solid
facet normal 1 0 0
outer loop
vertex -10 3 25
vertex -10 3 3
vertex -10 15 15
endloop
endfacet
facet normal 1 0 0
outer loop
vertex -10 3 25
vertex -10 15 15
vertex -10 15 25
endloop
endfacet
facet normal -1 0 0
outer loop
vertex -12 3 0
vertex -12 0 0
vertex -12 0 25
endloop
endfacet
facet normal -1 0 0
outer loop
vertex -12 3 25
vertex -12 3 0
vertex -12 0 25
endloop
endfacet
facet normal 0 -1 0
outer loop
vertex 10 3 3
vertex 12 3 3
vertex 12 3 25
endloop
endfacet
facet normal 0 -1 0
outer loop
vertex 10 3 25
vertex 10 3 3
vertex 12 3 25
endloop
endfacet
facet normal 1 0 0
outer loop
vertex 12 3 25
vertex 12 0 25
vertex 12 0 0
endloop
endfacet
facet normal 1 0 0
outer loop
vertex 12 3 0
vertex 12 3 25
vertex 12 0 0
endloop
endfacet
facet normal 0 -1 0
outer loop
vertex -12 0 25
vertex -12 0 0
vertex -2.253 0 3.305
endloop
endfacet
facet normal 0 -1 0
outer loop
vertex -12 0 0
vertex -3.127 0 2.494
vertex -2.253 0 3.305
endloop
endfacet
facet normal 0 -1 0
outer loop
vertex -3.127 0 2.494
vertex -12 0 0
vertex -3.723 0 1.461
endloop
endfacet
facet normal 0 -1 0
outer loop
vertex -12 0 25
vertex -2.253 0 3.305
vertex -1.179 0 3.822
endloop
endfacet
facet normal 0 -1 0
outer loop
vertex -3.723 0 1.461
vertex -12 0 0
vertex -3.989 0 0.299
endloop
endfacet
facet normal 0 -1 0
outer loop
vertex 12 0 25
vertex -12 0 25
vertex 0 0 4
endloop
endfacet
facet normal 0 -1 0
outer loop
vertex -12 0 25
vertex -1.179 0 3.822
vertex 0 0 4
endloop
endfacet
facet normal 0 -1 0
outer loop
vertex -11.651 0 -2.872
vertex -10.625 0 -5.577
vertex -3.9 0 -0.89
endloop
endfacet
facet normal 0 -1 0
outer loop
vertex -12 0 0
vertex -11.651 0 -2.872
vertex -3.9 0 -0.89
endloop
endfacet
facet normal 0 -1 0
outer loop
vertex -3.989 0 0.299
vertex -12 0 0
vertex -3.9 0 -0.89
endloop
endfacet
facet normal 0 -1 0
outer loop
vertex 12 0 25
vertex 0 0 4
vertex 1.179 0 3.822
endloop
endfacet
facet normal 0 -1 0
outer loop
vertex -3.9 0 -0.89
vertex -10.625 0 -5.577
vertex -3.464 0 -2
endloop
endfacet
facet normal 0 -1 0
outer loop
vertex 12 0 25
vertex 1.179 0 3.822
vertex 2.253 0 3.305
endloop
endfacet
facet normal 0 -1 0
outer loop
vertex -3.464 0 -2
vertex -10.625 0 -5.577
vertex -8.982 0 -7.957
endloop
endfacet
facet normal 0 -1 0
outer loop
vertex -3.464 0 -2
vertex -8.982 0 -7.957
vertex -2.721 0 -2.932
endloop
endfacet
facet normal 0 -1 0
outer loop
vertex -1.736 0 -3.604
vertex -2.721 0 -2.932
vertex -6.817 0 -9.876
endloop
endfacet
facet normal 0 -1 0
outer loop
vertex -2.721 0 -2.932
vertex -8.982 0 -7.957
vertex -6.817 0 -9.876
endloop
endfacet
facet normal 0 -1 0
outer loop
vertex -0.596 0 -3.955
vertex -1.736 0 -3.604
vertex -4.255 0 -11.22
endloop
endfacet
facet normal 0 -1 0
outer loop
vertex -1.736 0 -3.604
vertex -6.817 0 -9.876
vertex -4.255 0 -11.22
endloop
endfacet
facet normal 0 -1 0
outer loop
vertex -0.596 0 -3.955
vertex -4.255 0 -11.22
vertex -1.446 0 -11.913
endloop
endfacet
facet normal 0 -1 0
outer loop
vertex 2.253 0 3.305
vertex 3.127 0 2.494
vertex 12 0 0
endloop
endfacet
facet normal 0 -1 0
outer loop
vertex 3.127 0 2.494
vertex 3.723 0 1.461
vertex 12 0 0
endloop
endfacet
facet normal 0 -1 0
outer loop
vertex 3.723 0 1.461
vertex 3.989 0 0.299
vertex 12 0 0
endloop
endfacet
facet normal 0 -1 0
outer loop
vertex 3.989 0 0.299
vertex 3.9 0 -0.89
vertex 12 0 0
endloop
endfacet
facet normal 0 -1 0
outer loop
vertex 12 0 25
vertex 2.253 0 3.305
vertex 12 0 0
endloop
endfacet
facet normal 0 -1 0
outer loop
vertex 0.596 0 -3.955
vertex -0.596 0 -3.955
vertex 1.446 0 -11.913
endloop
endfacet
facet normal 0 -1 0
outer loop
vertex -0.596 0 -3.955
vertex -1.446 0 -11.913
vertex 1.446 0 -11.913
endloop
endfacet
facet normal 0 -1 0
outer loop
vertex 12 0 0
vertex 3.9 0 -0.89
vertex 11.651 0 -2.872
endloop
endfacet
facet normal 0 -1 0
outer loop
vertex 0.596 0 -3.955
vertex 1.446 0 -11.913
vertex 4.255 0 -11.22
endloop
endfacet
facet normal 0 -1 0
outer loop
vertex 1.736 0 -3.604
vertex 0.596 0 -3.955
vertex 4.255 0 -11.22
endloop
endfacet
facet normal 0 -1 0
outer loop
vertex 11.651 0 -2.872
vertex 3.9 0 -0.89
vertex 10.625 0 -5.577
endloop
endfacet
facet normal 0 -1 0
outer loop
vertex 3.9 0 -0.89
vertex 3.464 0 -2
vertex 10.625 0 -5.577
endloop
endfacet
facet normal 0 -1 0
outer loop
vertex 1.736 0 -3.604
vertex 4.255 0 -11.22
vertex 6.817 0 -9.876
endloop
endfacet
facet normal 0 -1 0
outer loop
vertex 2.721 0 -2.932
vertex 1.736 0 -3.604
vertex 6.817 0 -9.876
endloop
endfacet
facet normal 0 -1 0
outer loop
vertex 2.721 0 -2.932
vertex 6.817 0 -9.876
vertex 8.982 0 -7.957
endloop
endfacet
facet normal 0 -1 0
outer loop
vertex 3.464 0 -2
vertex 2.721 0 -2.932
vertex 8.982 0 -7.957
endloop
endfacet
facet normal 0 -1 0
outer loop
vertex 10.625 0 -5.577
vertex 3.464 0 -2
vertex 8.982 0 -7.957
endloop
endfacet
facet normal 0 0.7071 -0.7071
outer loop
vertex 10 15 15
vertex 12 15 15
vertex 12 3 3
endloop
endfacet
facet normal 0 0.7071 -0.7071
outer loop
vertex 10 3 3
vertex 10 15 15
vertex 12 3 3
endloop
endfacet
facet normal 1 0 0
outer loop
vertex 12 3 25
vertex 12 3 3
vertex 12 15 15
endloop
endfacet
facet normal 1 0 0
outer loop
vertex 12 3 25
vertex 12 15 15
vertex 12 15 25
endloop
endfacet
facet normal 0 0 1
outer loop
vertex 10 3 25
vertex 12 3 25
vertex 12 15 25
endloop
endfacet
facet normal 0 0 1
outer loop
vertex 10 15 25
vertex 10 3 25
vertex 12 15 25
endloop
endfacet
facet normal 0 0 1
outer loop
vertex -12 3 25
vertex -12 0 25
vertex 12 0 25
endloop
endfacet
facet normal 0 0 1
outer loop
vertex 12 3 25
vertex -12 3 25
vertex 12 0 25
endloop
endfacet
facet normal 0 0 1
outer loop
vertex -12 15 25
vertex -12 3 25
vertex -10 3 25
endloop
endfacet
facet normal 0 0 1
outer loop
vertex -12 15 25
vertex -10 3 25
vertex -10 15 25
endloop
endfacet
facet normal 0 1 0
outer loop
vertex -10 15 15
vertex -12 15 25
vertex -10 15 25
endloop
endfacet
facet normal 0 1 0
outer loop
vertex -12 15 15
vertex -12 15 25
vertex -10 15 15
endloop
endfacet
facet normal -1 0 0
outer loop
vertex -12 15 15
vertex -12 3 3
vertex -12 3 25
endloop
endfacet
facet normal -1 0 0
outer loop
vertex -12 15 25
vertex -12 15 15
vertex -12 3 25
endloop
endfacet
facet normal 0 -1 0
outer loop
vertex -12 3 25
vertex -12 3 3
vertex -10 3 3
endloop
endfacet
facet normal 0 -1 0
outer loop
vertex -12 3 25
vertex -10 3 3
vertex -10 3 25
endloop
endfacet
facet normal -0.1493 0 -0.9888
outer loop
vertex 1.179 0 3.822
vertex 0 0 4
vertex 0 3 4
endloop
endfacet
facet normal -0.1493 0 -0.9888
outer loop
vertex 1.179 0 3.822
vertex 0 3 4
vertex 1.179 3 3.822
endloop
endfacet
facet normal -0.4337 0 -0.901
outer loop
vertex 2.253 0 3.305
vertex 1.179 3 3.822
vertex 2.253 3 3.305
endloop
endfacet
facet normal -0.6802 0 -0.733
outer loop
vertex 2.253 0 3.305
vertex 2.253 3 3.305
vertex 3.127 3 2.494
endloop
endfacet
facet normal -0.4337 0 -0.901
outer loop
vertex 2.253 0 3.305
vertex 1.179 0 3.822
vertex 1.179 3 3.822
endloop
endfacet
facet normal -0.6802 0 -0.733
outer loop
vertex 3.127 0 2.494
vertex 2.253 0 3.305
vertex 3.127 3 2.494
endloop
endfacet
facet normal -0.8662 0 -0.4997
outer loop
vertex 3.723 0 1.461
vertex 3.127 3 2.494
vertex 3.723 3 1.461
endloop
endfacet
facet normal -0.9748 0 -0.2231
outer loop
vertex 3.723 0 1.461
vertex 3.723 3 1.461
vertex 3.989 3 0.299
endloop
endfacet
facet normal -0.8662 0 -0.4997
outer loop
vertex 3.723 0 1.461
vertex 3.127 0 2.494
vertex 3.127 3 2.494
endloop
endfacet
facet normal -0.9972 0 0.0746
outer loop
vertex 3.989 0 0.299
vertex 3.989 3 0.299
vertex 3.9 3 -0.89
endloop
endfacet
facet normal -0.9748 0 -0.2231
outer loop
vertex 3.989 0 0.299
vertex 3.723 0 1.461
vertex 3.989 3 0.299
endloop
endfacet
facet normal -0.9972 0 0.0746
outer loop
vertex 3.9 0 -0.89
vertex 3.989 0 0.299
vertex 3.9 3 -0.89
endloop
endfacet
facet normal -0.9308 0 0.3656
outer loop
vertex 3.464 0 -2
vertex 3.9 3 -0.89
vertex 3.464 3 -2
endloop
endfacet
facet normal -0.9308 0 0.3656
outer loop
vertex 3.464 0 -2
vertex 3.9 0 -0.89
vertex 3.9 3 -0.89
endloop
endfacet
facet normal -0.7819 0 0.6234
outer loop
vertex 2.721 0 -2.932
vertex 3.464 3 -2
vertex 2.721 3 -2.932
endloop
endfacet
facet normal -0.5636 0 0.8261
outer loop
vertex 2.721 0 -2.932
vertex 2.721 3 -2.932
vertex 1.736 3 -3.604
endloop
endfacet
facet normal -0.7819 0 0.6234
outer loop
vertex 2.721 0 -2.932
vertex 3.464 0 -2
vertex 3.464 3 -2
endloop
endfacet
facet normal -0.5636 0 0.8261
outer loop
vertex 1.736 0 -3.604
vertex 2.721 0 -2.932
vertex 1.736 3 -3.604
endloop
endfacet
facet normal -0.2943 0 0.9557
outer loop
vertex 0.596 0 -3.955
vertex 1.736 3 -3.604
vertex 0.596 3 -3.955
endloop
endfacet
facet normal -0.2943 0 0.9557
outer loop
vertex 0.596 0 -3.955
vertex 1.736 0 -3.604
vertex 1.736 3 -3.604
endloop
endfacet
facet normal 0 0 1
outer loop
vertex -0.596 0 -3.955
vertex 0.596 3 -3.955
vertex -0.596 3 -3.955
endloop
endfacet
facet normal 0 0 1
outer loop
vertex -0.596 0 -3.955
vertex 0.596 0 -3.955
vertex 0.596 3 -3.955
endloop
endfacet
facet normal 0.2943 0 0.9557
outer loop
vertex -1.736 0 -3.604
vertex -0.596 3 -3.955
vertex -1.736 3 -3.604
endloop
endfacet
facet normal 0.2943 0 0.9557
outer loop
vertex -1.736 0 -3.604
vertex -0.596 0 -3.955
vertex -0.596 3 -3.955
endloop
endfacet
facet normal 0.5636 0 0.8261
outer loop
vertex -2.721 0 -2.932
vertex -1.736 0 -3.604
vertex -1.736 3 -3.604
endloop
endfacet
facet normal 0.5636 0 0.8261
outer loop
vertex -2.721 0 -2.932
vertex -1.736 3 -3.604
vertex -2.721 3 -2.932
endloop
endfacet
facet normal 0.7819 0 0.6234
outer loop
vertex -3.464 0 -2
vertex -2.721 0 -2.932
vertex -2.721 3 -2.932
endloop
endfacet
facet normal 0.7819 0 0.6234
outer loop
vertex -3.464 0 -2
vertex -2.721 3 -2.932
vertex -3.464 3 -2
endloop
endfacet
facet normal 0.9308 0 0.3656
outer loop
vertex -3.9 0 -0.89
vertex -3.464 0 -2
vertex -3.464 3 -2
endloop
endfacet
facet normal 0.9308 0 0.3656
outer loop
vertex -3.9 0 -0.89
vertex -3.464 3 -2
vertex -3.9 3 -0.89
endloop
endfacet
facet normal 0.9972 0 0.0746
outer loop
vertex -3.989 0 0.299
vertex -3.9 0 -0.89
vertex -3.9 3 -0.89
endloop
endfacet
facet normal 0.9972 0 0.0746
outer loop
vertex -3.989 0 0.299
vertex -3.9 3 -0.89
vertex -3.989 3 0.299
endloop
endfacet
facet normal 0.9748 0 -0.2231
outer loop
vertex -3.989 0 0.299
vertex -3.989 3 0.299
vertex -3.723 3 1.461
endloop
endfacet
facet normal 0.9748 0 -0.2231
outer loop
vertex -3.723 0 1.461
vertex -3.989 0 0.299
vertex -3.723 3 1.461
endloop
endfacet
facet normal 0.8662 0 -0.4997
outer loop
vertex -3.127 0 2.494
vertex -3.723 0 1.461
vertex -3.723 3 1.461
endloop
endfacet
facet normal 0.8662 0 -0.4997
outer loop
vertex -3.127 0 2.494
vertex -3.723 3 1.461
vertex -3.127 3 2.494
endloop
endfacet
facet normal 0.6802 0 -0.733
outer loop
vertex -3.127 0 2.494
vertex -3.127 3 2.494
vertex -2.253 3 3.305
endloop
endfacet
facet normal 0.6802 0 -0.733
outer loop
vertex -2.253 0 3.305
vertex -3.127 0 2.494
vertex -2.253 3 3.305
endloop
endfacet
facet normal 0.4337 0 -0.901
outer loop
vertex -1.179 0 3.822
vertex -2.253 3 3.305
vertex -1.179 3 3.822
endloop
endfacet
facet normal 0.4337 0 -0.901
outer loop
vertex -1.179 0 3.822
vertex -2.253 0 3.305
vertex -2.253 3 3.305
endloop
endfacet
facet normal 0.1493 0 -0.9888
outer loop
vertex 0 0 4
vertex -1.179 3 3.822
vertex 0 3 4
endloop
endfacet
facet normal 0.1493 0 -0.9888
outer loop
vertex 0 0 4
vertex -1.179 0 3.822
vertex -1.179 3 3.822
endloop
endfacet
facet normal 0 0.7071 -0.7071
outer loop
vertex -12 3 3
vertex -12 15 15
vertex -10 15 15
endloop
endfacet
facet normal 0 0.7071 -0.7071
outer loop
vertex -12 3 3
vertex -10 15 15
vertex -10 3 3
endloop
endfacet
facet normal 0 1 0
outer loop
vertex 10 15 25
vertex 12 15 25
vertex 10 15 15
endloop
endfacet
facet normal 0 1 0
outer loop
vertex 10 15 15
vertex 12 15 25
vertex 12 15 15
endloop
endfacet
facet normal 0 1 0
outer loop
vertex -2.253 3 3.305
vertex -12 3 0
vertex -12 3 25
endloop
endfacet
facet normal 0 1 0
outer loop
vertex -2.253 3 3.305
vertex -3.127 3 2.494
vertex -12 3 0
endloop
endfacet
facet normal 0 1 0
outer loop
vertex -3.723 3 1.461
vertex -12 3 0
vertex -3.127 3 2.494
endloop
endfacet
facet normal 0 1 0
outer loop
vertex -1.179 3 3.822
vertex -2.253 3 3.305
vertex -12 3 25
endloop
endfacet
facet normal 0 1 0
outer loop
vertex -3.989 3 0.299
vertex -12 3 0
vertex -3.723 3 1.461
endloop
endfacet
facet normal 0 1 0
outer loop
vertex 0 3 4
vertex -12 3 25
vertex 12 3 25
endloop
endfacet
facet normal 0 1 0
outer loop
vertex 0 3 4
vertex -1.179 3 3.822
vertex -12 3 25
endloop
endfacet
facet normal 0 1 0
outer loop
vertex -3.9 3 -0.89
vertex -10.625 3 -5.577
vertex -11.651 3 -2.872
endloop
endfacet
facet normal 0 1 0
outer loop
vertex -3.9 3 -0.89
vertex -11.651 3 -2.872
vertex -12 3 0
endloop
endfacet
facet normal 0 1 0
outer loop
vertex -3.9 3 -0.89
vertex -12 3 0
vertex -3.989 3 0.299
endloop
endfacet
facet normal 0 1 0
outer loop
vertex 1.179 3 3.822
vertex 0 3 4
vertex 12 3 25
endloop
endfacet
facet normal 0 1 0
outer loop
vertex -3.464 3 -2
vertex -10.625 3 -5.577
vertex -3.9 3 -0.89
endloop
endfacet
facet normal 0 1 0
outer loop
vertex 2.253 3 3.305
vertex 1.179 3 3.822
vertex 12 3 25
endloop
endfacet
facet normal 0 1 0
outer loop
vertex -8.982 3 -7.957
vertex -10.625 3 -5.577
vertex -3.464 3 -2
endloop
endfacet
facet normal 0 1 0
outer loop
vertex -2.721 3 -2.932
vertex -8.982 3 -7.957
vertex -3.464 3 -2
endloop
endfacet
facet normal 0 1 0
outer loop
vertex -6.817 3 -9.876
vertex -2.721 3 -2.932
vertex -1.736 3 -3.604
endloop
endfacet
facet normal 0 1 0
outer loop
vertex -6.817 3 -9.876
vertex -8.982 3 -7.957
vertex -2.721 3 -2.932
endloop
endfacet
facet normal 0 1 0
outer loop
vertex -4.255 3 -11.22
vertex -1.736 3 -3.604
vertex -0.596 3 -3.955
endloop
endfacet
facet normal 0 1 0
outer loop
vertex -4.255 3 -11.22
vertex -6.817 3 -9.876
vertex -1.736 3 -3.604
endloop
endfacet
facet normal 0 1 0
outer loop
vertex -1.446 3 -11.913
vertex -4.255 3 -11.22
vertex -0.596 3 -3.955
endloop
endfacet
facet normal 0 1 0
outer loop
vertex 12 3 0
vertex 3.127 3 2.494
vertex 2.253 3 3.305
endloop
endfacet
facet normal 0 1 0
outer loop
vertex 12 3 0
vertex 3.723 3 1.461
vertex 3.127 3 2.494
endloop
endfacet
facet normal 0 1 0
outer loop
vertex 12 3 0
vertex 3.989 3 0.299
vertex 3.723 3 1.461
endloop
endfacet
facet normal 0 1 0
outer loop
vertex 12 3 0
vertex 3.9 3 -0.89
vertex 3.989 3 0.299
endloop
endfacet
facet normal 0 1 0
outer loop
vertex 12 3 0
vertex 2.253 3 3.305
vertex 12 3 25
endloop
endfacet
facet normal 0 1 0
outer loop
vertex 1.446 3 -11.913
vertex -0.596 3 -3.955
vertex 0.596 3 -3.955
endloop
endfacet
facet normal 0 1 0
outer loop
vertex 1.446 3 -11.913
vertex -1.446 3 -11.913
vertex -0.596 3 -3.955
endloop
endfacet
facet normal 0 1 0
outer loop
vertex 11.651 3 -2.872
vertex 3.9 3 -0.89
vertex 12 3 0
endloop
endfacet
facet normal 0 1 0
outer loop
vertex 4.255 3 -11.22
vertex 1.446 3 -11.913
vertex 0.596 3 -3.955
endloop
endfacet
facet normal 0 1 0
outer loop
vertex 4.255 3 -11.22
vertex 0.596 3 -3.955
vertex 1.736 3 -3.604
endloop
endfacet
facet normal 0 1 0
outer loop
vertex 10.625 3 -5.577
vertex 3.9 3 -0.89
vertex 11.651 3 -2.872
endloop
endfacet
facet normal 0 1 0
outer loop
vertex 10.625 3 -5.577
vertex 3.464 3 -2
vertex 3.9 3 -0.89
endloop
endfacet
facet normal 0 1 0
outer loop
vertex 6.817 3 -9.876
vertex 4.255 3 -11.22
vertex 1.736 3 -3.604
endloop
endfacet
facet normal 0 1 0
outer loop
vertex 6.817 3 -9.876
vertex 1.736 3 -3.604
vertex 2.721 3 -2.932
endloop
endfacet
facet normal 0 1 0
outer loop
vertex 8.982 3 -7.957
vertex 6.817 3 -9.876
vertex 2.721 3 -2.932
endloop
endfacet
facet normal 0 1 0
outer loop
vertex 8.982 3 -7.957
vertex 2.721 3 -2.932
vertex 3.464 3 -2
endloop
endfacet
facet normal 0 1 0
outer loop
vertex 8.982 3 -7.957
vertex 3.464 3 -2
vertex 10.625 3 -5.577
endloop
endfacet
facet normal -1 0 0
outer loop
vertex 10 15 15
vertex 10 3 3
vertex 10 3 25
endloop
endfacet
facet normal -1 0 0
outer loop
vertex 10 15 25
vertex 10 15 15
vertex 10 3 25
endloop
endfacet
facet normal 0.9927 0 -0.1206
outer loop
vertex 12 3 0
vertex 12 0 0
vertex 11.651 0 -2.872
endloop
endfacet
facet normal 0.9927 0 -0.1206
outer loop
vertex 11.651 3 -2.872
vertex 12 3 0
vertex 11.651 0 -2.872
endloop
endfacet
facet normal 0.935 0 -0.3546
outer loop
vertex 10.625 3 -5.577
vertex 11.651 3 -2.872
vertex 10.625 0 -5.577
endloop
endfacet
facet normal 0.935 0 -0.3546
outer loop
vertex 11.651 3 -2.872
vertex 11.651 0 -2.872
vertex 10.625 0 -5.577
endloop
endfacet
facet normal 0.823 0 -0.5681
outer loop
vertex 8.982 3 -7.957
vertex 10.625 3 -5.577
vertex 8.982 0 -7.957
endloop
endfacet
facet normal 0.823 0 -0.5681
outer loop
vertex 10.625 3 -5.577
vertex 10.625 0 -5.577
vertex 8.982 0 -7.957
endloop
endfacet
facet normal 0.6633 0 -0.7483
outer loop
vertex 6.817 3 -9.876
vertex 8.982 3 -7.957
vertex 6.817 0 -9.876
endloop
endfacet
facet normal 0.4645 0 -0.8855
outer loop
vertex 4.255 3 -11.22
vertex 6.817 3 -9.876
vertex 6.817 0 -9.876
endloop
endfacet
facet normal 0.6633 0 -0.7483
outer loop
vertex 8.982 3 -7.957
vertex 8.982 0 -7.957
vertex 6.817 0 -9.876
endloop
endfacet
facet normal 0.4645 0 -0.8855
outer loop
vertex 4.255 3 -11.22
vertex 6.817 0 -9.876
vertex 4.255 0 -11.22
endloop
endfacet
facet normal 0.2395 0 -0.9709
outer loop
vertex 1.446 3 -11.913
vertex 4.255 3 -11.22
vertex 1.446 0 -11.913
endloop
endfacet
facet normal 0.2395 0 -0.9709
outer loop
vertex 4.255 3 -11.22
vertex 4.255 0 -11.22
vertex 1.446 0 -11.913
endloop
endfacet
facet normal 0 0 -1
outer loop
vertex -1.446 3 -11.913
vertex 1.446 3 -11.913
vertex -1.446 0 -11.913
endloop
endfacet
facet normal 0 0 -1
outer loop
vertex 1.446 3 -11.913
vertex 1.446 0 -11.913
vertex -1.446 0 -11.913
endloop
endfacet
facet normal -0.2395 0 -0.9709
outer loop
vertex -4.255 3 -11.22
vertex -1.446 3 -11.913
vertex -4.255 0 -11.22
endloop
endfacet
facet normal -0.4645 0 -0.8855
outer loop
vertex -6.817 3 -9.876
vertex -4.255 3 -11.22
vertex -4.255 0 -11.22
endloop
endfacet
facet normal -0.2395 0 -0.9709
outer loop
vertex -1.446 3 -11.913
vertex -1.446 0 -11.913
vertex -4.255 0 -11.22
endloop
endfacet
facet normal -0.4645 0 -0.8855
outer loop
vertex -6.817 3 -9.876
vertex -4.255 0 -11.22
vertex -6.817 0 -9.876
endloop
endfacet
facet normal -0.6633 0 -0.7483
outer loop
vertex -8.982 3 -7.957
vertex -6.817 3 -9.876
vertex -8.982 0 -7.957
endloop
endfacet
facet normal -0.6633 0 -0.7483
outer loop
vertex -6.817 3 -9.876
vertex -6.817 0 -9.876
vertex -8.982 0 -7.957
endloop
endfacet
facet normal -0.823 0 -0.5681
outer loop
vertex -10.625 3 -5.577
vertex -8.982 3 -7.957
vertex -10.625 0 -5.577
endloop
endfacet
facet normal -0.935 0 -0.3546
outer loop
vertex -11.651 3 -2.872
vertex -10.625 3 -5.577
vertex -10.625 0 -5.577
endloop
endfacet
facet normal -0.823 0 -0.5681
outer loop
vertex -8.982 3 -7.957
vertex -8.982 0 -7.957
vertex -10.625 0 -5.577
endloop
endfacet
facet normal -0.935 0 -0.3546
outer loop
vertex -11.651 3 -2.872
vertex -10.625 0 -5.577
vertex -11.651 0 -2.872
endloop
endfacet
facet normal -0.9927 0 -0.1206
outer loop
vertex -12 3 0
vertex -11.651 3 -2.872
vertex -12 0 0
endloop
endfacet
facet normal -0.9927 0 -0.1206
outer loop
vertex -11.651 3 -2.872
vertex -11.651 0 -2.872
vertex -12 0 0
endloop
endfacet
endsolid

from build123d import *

# Parameters (mm, degrees)
SKETCH_1_R          = 12
SKETCH_1_R_2        = 4
EXTRUDE_1_DEPTH     = 3
EXTRUDE_2_DEPTH     = 2
BOSS_EXTRUDE1_START = -24
BOSS_EXTRUDE1_DEPTH = 2


with BuildPart() as part:
    # 草图1 → 凸台-拉伸1 (new body)
    # profile 1 of 2: a face of its own
    with BuildSketch(Plane(origin=(0, 0, 0), x_dir=(1, 0, 0), z_dir=(0, 1, 0))):
        Circle(SKETCH_1_R)
        with Locations(Location((0, 0, 0), (0, 0, 270))):
            Circle(SKETCH_1_R_2, mode=Mode.SUBTRACT)
    # profile 2 of 2: a face of its own
    with BuildSketch(Plane(origin=(0, 0, 0), x_dir=(1, 0, 0), z_dir=(0, 1, 0))):
        with BuildLine():
            ThreePointArc((12, 0), (0, -12), (-12, 0))
            Line((-12, 0), (-12, -25))
            Line((-12, -25), (12, -25))
            Line((12, -25), (12, 0))
        make_face()
    extrude(amount=EXTRUDE_1_DEPTH)


with BuildPart() as body_2:
    # 草图3 → 凸台-拉伸2 (new body)
    with BuildSketch(Plane(origin=(12, 0, 0), x_dir=(0, 0, -1), z_dir=(1, 0, 0))):
        Polygon((-25, 3), (-25, 15), (-15, 15), (-3, 3), align=None)
    extrude(amount=-EXTRUDE_2_DEPTH)


with BuildPart() as body_3:
    # 草图3<2> → Boss-Extrude1 (new body)
    with BuildSketch(Plane(origin=(12, 0, 0), x_dir=(0, 0, -1), z_dir=(1, 0, 0)).offset(BOSS_EXTRUDE1_START)):
        Polygon((-25, 3), (-25, 15), (-15, 15), (-3, 3), align=None)
    extrude(amount=BOSS_EXTRUDE1_DEPTH)


solid = Compound([part.part, body_2.part, body_3.part])
